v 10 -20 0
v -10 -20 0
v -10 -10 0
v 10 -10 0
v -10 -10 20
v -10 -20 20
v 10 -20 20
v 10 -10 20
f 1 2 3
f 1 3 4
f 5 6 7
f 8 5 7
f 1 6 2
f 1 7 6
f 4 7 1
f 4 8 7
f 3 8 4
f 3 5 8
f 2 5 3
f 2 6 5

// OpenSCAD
// Compatible subset of the official linear_extrude example.
translate([0, -15, 0])
    linear_extrude(height = 20)
        square([20, 10], center = true);
